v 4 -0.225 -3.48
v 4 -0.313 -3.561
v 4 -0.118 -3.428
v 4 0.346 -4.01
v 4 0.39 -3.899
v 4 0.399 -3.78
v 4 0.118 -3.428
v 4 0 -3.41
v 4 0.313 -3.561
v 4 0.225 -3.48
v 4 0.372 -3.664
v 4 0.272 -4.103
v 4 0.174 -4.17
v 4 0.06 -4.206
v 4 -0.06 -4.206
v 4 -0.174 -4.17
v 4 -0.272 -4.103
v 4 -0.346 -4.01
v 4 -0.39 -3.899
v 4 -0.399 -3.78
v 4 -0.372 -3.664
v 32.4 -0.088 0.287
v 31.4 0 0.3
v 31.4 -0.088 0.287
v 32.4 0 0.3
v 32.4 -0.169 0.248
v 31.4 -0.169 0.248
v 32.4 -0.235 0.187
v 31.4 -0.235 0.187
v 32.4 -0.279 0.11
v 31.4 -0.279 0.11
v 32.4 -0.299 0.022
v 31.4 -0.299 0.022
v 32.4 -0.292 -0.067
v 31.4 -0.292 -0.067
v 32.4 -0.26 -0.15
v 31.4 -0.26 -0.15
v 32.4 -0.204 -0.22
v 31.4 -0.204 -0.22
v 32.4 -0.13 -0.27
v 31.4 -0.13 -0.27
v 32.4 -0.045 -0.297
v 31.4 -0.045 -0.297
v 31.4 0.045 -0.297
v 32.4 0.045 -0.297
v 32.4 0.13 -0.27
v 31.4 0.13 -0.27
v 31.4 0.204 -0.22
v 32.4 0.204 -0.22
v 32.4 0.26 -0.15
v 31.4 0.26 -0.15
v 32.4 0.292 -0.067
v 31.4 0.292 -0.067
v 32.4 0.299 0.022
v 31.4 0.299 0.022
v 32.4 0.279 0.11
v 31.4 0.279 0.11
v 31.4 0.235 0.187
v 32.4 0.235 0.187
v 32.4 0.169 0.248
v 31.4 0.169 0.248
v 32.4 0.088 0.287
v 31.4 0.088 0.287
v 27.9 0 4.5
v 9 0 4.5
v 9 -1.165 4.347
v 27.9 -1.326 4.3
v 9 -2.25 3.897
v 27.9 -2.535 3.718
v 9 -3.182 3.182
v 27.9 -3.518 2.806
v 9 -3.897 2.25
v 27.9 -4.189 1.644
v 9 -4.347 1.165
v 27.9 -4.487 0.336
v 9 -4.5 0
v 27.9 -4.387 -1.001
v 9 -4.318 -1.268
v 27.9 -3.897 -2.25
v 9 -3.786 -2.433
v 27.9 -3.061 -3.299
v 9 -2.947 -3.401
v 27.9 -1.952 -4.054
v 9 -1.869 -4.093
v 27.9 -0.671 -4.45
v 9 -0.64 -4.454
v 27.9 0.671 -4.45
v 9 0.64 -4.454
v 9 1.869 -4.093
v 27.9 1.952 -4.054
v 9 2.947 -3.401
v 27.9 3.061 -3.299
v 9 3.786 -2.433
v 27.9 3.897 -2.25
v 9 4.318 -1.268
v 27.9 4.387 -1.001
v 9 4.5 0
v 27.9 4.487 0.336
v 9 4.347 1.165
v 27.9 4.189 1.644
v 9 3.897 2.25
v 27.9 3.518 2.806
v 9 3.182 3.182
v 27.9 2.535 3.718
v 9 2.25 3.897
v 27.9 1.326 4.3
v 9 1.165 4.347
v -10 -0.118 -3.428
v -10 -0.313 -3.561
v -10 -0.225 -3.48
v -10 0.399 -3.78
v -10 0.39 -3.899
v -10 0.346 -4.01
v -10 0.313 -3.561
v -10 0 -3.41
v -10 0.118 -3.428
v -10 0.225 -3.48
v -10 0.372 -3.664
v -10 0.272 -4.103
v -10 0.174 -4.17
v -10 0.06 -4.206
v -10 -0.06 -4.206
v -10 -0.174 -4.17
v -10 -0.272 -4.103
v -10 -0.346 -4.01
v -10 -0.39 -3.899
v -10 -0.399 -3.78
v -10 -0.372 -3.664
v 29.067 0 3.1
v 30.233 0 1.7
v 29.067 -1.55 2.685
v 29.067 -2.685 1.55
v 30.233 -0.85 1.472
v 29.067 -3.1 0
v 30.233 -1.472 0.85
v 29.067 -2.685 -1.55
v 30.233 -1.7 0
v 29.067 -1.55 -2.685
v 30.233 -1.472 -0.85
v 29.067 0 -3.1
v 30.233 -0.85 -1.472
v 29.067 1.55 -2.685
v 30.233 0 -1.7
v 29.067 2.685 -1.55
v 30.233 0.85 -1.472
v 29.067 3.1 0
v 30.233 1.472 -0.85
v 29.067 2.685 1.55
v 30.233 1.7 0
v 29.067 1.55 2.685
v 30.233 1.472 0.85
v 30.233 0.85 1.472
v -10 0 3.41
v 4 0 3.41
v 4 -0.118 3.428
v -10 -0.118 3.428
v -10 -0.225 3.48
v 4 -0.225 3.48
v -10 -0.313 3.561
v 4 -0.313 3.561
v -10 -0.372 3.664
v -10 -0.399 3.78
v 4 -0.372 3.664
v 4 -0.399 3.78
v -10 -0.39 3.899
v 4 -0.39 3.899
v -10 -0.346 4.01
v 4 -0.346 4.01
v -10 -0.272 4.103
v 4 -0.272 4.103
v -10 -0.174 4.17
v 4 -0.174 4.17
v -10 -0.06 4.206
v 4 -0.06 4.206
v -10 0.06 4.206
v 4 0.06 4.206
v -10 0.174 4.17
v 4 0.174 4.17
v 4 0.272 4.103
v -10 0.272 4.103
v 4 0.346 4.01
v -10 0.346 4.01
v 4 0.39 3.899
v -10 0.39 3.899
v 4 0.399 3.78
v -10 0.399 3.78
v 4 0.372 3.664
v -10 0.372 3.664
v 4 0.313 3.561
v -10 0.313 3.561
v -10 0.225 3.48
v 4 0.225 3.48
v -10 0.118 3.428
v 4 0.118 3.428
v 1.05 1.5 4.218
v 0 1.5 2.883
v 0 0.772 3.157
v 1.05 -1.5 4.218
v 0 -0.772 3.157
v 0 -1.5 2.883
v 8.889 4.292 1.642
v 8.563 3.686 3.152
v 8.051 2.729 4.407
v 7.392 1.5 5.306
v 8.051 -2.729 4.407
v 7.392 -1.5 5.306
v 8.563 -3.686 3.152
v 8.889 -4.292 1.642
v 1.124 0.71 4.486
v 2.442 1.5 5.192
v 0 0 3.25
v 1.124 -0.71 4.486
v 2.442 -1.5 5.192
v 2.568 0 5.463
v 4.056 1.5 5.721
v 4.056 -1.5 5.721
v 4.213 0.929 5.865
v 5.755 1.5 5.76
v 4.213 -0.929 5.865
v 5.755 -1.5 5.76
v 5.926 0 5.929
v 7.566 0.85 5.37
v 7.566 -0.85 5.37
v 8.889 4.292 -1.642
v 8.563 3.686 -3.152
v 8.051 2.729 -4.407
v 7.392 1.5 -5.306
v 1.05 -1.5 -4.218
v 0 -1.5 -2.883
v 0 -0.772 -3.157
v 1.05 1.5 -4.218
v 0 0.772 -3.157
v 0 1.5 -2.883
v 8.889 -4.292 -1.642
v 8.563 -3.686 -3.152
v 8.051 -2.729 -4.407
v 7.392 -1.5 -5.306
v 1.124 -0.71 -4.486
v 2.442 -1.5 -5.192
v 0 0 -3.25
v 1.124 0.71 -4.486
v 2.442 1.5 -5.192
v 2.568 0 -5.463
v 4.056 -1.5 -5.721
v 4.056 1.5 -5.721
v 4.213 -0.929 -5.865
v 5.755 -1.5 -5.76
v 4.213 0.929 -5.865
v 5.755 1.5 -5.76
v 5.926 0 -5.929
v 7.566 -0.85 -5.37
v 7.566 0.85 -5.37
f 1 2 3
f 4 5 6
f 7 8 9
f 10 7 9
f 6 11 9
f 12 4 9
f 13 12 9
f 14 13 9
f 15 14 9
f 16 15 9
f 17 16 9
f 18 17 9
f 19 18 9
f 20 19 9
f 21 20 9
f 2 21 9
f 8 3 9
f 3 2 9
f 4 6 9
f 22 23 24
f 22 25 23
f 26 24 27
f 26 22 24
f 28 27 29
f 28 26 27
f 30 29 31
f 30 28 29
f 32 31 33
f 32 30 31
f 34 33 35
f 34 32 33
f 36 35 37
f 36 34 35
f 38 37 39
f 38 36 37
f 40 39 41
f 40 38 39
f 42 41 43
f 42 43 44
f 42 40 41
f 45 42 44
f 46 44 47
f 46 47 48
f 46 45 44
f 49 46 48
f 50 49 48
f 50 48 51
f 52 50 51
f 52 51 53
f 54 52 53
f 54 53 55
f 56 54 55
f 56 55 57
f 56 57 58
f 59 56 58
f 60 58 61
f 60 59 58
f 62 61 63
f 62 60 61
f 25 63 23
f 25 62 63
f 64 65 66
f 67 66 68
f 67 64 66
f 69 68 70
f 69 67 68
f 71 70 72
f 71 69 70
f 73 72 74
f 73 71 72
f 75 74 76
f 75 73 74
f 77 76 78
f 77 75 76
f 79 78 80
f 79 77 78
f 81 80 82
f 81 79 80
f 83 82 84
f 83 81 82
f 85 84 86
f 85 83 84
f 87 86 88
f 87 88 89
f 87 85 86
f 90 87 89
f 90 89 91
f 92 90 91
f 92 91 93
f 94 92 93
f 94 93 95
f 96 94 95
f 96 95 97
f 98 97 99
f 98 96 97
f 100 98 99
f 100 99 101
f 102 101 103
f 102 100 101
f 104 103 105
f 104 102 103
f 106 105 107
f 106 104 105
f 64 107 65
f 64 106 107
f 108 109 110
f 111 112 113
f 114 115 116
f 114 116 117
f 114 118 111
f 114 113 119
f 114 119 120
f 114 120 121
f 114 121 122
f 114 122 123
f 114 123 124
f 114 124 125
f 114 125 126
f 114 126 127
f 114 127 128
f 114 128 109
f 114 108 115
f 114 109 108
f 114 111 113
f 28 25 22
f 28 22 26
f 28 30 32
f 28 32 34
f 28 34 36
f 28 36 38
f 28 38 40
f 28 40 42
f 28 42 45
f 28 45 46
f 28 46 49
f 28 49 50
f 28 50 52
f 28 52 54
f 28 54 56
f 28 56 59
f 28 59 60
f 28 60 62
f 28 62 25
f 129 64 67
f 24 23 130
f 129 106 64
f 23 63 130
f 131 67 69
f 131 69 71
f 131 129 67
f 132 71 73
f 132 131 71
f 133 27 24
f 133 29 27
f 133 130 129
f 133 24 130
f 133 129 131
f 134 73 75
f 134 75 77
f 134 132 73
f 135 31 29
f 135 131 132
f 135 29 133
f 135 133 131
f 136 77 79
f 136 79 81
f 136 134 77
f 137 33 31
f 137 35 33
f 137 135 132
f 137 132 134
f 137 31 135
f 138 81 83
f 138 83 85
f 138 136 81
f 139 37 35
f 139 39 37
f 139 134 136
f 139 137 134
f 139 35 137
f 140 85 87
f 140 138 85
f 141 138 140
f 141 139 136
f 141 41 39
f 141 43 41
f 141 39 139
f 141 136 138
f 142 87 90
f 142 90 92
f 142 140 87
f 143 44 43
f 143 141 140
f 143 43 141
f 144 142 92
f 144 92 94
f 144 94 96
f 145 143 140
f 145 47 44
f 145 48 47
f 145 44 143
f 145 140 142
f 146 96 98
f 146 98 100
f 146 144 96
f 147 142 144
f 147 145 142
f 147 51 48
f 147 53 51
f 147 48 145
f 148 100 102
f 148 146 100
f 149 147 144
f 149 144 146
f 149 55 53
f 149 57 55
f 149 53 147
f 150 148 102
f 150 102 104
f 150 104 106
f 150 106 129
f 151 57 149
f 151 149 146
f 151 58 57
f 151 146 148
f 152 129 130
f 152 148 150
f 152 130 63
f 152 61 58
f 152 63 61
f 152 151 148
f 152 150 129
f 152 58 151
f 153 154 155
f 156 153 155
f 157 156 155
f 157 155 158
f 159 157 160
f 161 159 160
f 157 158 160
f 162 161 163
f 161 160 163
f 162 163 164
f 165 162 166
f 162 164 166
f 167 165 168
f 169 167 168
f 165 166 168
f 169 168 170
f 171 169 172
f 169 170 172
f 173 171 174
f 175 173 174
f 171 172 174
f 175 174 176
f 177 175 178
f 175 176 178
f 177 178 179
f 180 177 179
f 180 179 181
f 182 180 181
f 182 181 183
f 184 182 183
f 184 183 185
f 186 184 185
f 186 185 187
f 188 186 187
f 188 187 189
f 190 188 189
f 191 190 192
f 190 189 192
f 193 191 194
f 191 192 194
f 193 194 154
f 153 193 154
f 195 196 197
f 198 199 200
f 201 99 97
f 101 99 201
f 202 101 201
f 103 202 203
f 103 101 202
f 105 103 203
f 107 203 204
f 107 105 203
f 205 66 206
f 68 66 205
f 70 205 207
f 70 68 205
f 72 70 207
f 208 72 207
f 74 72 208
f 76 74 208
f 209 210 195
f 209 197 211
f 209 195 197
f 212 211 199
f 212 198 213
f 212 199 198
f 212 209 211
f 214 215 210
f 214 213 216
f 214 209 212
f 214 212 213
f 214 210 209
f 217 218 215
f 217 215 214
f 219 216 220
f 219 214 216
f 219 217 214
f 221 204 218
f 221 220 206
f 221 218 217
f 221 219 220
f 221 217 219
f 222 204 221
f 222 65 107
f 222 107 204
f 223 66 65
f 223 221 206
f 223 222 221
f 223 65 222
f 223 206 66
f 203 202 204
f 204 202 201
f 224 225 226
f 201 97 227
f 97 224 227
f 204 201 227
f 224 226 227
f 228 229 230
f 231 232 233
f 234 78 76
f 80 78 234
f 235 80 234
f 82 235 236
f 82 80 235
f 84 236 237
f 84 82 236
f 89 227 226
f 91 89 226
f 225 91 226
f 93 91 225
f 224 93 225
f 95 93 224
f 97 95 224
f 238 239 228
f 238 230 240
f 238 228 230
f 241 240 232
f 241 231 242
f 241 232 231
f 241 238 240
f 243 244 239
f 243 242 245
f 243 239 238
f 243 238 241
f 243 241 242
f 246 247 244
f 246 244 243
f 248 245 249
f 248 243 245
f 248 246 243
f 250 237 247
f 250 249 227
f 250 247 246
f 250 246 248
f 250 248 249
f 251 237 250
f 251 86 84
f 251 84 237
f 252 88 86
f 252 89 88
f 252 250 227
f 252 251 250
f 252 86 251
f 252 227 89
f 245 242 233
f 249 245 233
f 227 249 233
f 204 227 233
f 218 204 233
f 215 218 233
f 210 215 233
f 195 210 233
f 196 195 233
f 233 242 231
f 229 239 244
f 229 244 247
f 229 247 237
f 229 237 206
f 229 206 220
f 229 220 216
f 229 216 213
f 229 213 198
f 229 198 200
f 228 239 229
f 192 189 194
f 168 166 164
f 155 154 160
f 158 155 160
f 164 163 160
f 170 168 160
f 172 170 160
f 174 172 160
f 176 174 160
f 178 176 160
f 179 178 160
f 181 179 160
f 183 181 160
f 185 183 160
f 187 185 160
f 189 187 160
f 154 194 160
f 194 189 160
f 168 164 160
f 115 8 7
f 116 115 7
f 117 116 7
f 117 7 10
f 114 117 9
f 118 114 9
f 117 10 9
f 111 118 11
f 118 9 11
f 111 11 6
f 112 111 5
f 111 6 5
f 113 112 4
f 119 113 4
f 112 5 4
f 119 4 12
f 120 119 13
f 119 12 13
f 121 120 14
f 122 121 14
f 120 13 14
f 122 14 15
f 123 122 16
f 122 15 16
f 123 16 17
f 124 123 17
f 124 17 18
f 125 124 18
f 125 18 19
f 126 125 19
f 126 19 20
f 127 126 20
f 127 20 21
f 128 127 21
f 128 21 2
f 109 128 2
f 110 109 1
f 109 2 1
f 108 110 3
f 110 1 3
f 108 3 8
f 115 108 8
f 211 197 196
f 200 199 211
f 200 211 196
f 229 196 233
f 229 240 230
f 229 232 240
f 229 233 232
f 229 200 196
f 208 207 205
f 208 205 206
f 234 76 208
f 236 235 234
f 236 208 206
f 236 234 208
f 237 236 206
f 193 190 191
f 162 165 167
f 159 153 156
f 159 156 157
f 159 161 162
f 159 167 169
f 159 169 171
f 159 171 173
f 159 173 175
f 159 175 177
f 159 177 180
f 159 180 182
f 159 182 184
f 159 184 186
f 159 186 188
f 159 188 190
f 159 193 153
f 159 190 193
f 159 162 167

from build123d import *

# Parameters (mm, degrees)
CUT_EXTRUDE_1_DEPTH      = 10
CUT_EXTRUDE_1_DEPTH_BACK = 10
EXTRUDE_1_DEPTH          = 10
EXTRUDE_1_DEPTH_BACK     = 4
SKETCH_2_R               = 0.4
EXTRUDE_1_2_DEPTH        = 10
EXTRUDE_1_2_DEPTH_BACK   = 4


with BuildPart() as part:
    # 草图1 → 旋转1 (revolve)
    with BuildSketch(Plane.XY):
        with BuildLine():
            Line((0, 0), (0, 3.25))
            ThreePointArc((0, 3.25), (4.213404617, 5.93848676), (9, 4.5))
            Line((9, 4.5), (27.9, 4.5))
            Line((27.9, 4.5), (31.4, 0.3))
            Line((31.4, 0.3), (32.4, 0.3))
            Line((32.4, 0.3), (32.4, 0))
            Line((32.4, 0), (0, 0))
        make_face()
    revolve(axis=Axis((-53.438104907, 0, 0), (1, 0, 0)))

    # 草图3 → 切除-拉伸1 (cut, two sides: drawn at the far end of the back side and taken through both)
    with BuildSketch(Plane.XY.offset(-CUT_EXTRUDE_1_DEPTH_BACK)):
        Polygon((9, 4.5), (7.391565763, 1.5), (-2.815334695, 1.5), (-2.815334695, 8.903303641), (9, 8.903303641), align=None)
        Polygon((9, -8.903303641), (9, -4.5), (7.391565763, -1.5), (-2.815334695, -1.5), (-2.815334695, -8.903303641), align=None)
    extrude(amount=CUT_EXTRUDE_1_DEPTH + CUT_EXTRUDE_1_DEPTH_BACK, mode=Mode.SUBTRACT)


with BuildPart() as body_2:
    # 草图2 → 凸台-拉伸1 (new, two sides: drawn at the far end of the back side and taken through both)
    with BuildSketch(Plane.ZY.offset(-EXTRUDE_1_DEPTH_BACK)):
        with Locations((-3.81, 0)):
            Circle(SKETCH_2_R)
    extrude(amount=EXTRUDE_1_DEPTH + EXTRUDE_1_DEPTH_BACK)


with BuildPart() as body_3:
    # 草图2 → Extrude 1 2 (new, two sides: drawn at the far end of the back side and taken through both)
    with BuildSketch(Plane.ZY.offset(-EXTRUDE_1_2_DEPTH_BACK)):
        with Locations((3.81, 0)):
            Circle(SKETCH_2_R)
    extrude(amount=EXTRUDE_1_2_DEPTH + EXTRUDE_1_2_DEPTH_BACK)


solid = Compound([part.part, body_2.part, body_3.part])
